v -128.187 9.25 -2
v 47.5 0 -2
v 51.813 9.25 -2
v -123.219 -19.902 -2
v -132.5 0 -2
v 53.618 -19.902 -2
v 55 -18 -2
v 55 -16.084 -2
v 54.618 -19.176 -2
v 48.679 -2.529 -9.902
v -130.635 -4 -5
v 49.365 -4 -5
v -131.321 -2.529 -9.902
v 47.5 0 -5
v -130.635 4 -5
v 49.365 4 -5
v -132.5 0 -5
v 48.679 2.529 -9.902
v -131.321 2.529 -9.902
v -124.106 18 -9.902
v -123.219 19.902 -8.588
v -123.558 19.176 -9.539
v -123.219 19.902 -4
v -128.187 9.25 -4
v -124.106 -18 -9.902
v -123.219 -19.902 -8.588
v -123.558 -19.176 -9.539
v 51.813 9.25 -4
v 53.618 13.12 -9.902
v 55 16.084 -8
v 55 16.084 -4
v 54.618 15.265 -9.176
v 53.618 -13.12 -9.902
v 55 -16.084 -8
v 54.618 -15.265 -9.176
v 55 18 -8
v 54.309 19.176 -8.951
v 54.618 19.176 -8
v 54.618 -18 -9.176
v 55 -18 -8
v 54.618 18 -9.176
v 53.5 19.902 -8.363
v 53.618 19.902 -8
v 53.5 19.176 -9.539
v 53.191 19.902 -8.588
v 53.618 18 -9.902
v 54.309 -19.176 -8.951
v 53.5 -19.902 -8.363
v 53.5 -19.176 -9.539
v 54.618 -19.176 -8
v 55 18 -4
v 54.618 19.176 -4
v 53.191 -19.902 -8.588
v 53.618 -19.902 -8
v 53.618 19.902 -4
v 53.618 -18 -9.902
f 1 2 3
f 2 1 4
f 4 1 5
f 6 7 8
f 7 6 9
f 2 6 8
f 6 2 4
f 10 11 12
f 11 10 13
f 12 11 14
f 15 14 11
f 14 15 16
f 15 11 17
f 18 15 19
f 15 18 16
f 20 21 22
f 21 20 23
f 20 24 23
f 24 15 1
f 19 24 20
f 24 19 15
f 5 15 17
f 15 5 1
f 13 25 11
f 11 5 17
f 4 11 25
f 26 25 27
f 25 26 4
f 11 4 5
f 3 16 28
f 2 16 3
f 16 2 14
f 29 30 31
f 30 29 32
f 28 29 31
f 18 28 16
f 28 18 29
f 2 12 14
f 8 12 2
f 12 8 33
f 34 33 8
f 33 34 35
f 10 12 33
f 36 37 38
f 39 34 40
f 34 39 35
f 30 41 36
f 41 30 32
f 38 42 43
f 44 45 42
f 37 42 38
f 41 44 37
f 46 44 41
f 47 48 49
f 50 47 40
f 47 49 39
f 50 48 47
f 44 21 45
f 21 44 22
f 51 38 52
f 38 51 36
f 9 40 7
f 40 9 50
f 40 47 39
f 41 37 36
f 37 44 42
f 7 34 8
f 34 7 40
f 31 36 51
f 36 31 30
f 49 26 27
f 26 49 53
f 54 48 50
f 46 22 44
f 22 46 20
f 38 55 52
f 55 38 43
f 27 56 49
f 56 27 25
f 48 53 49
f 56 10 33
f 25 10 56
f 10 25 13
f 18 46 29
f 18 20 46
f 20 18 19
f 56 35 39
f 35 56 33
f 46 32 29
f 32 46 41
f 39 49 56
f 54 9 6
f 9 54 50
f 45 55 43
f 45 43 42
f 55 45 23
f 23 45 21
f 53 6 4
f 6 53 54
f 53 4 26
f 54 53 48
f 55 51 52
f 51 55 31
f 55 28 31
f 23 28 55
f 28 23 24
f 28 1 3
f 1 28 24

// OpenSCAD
// file: ../../globals.scad
/*
Most things in this file is represented as one millimeter, so keep that in mind while changing things.
Some of the setting are not mm but at variables that you can set, such as 2*x=2x and you are setting what x is.
I will try to specify when things are variables and not exact measurements.
*/

// printer slop, used by snappy parts
slop = 0.15;

//Virindi settings
dovetail_male_width_scale = 0.98;
dovetail_male_height_scale = 0.91;

obj_leg = 30;
leg_length = 5.5;
small_number = 0.001;
metal_core_rode_global = 5;


///////////////// number of holes /////////////////////
z_hole_number = 8;
other_holes = 8;

///////////////// Pins /////////////////////

//pins that poke out
ball_size = 10;
pin_height = 20;
pin_diameter = 6;


//holes
hole_ball_size = ball_size;
hole_pin_height = pin_height;
hole_pin_diameter = pin_diameter;

///////////////// Z THINGS /////////////////////

berring_slot_width = 7.5;
berring_slot_depth = 6.5;
metal_core_rode = 5;

///////////////// X THINGS /////////////////////

//male dove tails
max_width=8;
min_width=5;
depth=5;
height=obj_leg/2;

//female dove tails, this is found on the y mounts
girl_max_width=11;
girl_min_width=5;
girl_depth=5;
girl_height=obj_leg;


///////////////// Y THINGS /////////////////////
/*
The Y is so normal that all of those global variables at the top should change all of the setting in it, this section is set her incase there are variables set in the future development of this project.
*/

// stepper
motor_side_length = 43.2;
motor_bolt_hole_distance = 31;
motor_center_hole = 23;
motor_shaft_dia = 5;
motor_shaft_hole_dia = 5+2*slop;

// bolts etc.
bolt_hole_dia = 3+2*slop;
bolt_head_hole_dia = 5.8;

m3_nut_side = 5.65;

// threaded rod
lifter_rod_diam = 9.86;
hole_threaded_rod = lifter_rod_diam+2*slop;
// file: ../../include.scad
use <globals.scad>

//////////////////      END SECTION       //////////////////

	module added_pins(){
		difference(){
			union(){
				translate([30/(15/4),obj_leg*leg_length,30/(15/4)]) pin();
				translate([30/(15/4)+14.5,obj_leg*leg_length,30/(15/4)+14]) pin();
			}
			union(){
							translate([30/(15/4)+13.5,obj_leg*leg_length-20,30/(15/4)+5])cube(size=[2,40,15]);
							translate([30/(15/4)+7.5,obj_leg*leg_length-20,30/(15/4)+15])rotate([0,90,0]) cube(size=[2,40,15]);	

							translate([30/(15/4)-1,obj_leg*leg_length-20,30/(15/4)-8])cube(size=[2,40,15]);
							translate([30/(15/4)-10,obj_leg*leg_length-20,30/(15/4)+1])rotate([0,90,0]) cube(size=[2,40,15]);
			}
		}
	}
	module taken_pins() {
		translate([30/(15/4)+14,obj_leg*leg_length-10,30/(15/4)]) mirror_pin();
		translate([30/(15/4),obj_leg*leg_length-10,30/(15/4)+15]) mirror_pin();
	}


//////////////////      OTHER STUFF       //////////////////

	module holes() {
		rotate([0,0,90]) for(y=[0:other_holes])
		translate([obj_leg+y*15,-15.5,7.5]) union() {
			translate([7.5,0,15]) hole_up();
			hole_down();
		}
	}
	module extend_holes() {
	module top(){
		rotate([0,0,90]) for(y=[0:other_holes+1])
		translate([(30/4)+y*15,-15.5,7.5]) union() {
			translate([7.5,0,15]) hole_up();
		}
	}
	module bottom(){
		rotate([0,0,90]) for(y=[0:other_holes+2])
		translate([(30/4)+y*15,-15.5,7.5]) union() {
			hole_down();
		
}
	}
	union(){
		top();
		bottom();
	}
	}

	module hole() {
		union() {
			rotate([90, 90, 0]) cylinder(h=40, d=hole_pin_diameter, center=true);
			translate([0,7.5,0]) sphere(d=hole_ball_size);
			translate([0,-6,0]) sphere(d=hole_ball_size);
		}
	}
	module hole_up() {
		union() {
			rotate([90, 90, 0]) cylinder(h=40, d=hole_pin_diameter, center=true);
			translate([0,7.5,10]) cylinder(h=hole_pin_height, d=hole_pin_diameter, center=true);
			translate([0,-6,10]) cylinder(h=hole_pin_height, d=hole_pin_diameter, center=true);
			translate([0,7.5,0]) sphere(d=hole_ball_size);
			translate([0,-6,0]) sphere(d=hole_ball_size);
		}
	}
	module hole_down() {
		union() {
			rotate([90, 90, 0]) cylinder(h=40, d=hole_pin_diameter, center=true);
			translate([0,7.5,-10]) cylinder(h=hole_pin_height, d=hole_pin_diameter, center=true);
			translate([0,-6,-10]) cylinder(h=hole_pin_height, d=hole_pin_diameter, center=true);
			translate([0,7.5,0]) sphere(d=hole_ball_size);
			translate([0,-6,0]) sphere(d=hole_ball_size);
		}
	}
	module pin() {
		union() {
			rotate([90, 90, 0]) cylinder(h=pin_height, d=pin_diameter, center=true);
			translate([0,7.5,0]) sphere(d=ball_size);
		}
	}

	module mirror_pin() {
		rotate([90, 90, 0]) cylinder(h=hole_pin_height+small_number, d=hole_pin_diameter, center=true);
		translate([0,-(pin_height-(ball_size/2)),0]) sphere(d=ball_size);
	}


//////////////////      SOME RACK AND Z THINGS       //////////////////

module z_holes() {
    rotate([0,-90,0]) for(z=[0:z_hole_number])
    translate([22.5+z*15,16,-12])
        hole();
}

module pin_cuts() {
	union(){
		cube(size=[2,10,40], center=true);
		rotate([0,0,90]) cube(size=[2,10,40], center=true);
	}
}
module pin_uncut() {
	union(){
		rotate([0, 0, 90]) cylinder(h=hole_pin_height, d=hole_pin_diameter, center=true);
		translate([0,0,10]) sphere(d=ball_hole);
	}
}


module pin_out() {
	union(){
		rotate([0, 0, 90]) cylinder(h=pin_height, d=pin_diameter, center=true);
		translate([0,0,10]) sphere(d= ball_size);
	}
}


module pins_z(){
	difference() {
		pin_out();
		pin_cuts();
	}
}

module rounded_cube(width,depth,height){
    hull(){
        translate([width/2-diameter/2,depth/2-diameter/2,height/2-diameter/2]) sphere(d=diameter);
        translate([width/2-(diameter/2),depth/2-(diameter/2),-height/2+(diameter/2)]) sphere(d=diameter);
        translate([-width/2+diameter/2,depth/2-diameter/2,height/2-diameter/2]) sphere(d=diameter);
        translate([-width/2+(diameter/2),depth/2-(diameter/2),-height/2+(diameter/2)]) sphere(d=diameter);
        
        translate([width/2-diameter/2,-depth/2+diameter/2,height/2-diameter/2]) sphere(d=diameter);
        translate([width/2-(diameter/2),-depth/2+(diameter/2),-height/2+(diameter/2)]) sphere(d=diameter);
        translate([-width/2+diameter/2,-depth/2+diameter/2,height/2-diameter/2]) sphere(d=diameter);
        translate([-width/2+(diameter/2),-depth/2+(diameter/2),-height/2+(diameter/2)]) sphere(d=diameter);
    }
}

module motor_shaft_hole(h=10) {
    difference() {
        cylinder(d=motor_shaft_hole_dia, h=h);
        translate([0,4.5,h/2]) cube([5,5,h], center=true); 
    }
}
//////////////////      RACK AND SLIDE     ///////////////////

module straight_pins() {
	for(z=[0:((((obj_leg*leg_length)*2)-(obj_leg*2))/3)/14.5]) rotate([-90,0,0]) translate([z*15,30/(15/4),14]) pins_z();
	for(z=[0:((((obj_leg*leg_length)*2)-(obj_leg*2))/3)/14.5]) rotate([-90,0,0]) translate([z*15,30/(15/4)-14,14]) pins_z();
}
module stagger_pins() {
	for(z=[0:((((obj_leg*leg_length)*2)-(obj_leg*2))/3)/14.5]) rotate([-90,0,0]) translate([z*15,30/(15/4),14]) pins_z();
	for(z=[0:((((obj_leg*leg_length)*2)-(obj_leg*2))/3)/14.5]) rotate([-90,0,0]) translate([z*15+7,30/(15/4)-14,14]) pins_z();
}


//////////////////      DOVE TAIL       //////////////////

module male_dovetail(height) {
	dovetail_3d(max_width,min_width,depth,height);
}

module dovetail_3d(max_width=11, min_width=5, depth=5, height=30) {
	linear_extrude(height=height, convexity=2)
		dovetail_2d(max_width,min_width,depth);
}

module dovetail_2d(max_width=11, min_width=5, depth=5) {
	angle=atan((max_width/2-min_width/2)/depth);
	echo("angle: ", angle);
	polygon(paths=[[0,1,2,3,0]], points=[[-min_width/2,0], [-max_width/2,depth], [max_width/2, depth], [min_width/2,0]]);
}

//bow tie
	module tie_end(height){
				rotate([0,0,0]) translate([0,-0.01,((obj_leg/2)/2)]) male_dovetail(height);
				rotate([0,90,0]) translate([0,-0.01,((obj_leg/2)/2)]) male_dovetail(height);
				rotate([0,180,0]) translate([0,-0.01,((obj_leg/2)/2)]) male_dovetail(height);
				rotate([0,-90,0]) translate([0,-0.01,((obj_leg/2)/2)]) male_dovetail(height);
	}

module bow_support(){
	difference(){
		intersection(){
			translate([-15,0,-15]) cube([30,9,30]);
			scale([1.05,1.05,1.05]) rotate([0,45,0]) tie_end();
		}
		cube([29.2,29.2,29.2], center=true);
	}
}

	module wrap(units){
	for (y = [-1:units-2]) // two iterations, z = -1, z = 1
	{
			translate([15, (y*30)+15, 15]){
			for (r = [0:4]) // two iterations, z = -1, z = 1
			{
				rotate([0,r*90,0]) translate([0,15,15]) rotate([-90,0,0])male_dovetail(height=30);
			}
		}
	}
	}
// main file
include <../../include.scad>;
include <../../globals.scad>;


//globals

obj_height = 40;
//units = 10; //only even numbers
tail_depth = 8;
tie_scale_x = 1;
tie_scale_y = 1;
tie_scale_z = 1;
gear_cut_depth = 4;
gear_cut_from_center = 9.25;
rounding_diameter = 4;

resolution = 10;

//good things
module rounded_cube(width,depth,height){
    hull(){
        translate([width/2-rounding_diameter/2,depth/2-rounding_diameter/2,height/2-rounding_diameter/2]) sphere(d=rounding_diameter);
        translate([width/2-(rounding_diameter/2),depth/2-(rounding_diameter/2),-height/2+(rounding_diameter/2)]) sphere(d=rounding_diameter);
        translate([-width/2+rounding_diameter/2,depth/2-rounding_diameter/2,height/2-rounding_diameter/2]) sphere(d=rounding_diameter);
        translate([-width/2+(rounding_diameter/2),depth/2-(rounding_diameter/2),-height/2+(rounding_diameter/2)]) sphere(d=rounding_diameter);
        
        translate([width/2-rounding_diameter/2,-depth/2+rounding_diameter/2,height/2-rounding_diameter/2]) sphere(d=rounding_diameter);
        translate([width/2-(rounding_diameter/2),-depth/2+(rounding_diameter/2),-height/2+(rounding_diameter/2)]) sphere(d=rounding_diameter);
        translate([-width/2+rounding_diameter/2,-depth/2+rounding_diameter/2,height/2-rounding_diameter/2]) sphere(d=rounding_diameter);
        translate([-width/2+(rounding_diameter/2),-depth/2+(rounding_diameter/2),-height/2+(rounding_diameter/2)]) sphere(d=rounding_diameter);
    }
}  

module tie_taken(){
		difference(){
			translate([0,tail_depth,0]) rotate([0,90,180]) scale([tie_scale_x,tie_scale_z,tie_scale_y])  male_dovetail(height=30);
		}
}


//herring bone style rack made from inkscape and OpenScad
module rackObject(units=10) {

    module rackHalf(){
        intersection() {
            union() {
                rotate(a=[0,-25,0]) {
                    linear_extrude(height = obj_height*5, center = true, convexity = 10)
                    import (file = "rack.dxf", layer = "Layer_1");
                }
            }
			translate([0, 0, obj_height/4*-1]) cube(center = true, [31, 50, obj_height/2]);
        }
    }
    module rackFull(){
        intersection() {
            union() {
                mirror([0,0,1]) rackHalf();
                rackHalf();
            }
            union() {
                cube(center = true, [20, 30, obj_height-8]);

            }
        }
    }

    for(rack_length=[-units:5]){
        translate([rack_length*20,0,0]) {
					intersection(){
						rackFull();
						scale([1,.25,1]) translate([0,5,0]) rotate([0,90,0]) cylinder(r=15, h=40, center=true);
					}
		}
	}

	for(rack_length=[-units:1]){
		difference(){
			translate([30*rack_length+15,6,0]) cube([30,8,40], center=true);
		}
	}
}

module rack(units=10)
{
    difference(){
    intersection(){
    //translate([0,0,-10]) cube([20,20,20]);
        intersection(){
            rotate([-90,0,0]) translate([-10-((units-2)*15),0,0]) translate([30,0,0]) rounded_cube(30*units+10,20,40,$fn=resolution);
            union(){
                rotate([-90,0,0]) intersection(){
                    difference(){
                        rackObject();
                        for(rack_length=[-units:1]){
                            translate([30*rack_length+30,2,0]) tie_taken();
                        }
                    }

                    difference(){
                        union(){
                            translate([30,0,0]) rounded_cube(30*units,20,40,$fn=50);
                            translate([-12.5-((units-2)*15),-5,0]) rotate([0,25,0]) cube([30,30,30]);
                            mirror([0,0,1]) translate([-12.5-((units-2)*15),-5,0]) rotate([0,25,0]) cube([30,30,30]);
                        }
                        union(){
                            translate([47.5,-5,0]) rotate([0,25,0]) cube([units*30,30,units*30]);
                            mirror([0,0,1]) translate([47.5,-5,0]) rotate([0,25,0]) cube([units*30,30,units*30]);
                        }
                    }
                //intersection
                }
            //union
            }
        //intersection
        }
    //intersection
    }

    translate([0,10+gear_cut_from_center,25-gear_cut_depth])
    cube([30*units+1,20,50],center=true);
    }
}

rack();
